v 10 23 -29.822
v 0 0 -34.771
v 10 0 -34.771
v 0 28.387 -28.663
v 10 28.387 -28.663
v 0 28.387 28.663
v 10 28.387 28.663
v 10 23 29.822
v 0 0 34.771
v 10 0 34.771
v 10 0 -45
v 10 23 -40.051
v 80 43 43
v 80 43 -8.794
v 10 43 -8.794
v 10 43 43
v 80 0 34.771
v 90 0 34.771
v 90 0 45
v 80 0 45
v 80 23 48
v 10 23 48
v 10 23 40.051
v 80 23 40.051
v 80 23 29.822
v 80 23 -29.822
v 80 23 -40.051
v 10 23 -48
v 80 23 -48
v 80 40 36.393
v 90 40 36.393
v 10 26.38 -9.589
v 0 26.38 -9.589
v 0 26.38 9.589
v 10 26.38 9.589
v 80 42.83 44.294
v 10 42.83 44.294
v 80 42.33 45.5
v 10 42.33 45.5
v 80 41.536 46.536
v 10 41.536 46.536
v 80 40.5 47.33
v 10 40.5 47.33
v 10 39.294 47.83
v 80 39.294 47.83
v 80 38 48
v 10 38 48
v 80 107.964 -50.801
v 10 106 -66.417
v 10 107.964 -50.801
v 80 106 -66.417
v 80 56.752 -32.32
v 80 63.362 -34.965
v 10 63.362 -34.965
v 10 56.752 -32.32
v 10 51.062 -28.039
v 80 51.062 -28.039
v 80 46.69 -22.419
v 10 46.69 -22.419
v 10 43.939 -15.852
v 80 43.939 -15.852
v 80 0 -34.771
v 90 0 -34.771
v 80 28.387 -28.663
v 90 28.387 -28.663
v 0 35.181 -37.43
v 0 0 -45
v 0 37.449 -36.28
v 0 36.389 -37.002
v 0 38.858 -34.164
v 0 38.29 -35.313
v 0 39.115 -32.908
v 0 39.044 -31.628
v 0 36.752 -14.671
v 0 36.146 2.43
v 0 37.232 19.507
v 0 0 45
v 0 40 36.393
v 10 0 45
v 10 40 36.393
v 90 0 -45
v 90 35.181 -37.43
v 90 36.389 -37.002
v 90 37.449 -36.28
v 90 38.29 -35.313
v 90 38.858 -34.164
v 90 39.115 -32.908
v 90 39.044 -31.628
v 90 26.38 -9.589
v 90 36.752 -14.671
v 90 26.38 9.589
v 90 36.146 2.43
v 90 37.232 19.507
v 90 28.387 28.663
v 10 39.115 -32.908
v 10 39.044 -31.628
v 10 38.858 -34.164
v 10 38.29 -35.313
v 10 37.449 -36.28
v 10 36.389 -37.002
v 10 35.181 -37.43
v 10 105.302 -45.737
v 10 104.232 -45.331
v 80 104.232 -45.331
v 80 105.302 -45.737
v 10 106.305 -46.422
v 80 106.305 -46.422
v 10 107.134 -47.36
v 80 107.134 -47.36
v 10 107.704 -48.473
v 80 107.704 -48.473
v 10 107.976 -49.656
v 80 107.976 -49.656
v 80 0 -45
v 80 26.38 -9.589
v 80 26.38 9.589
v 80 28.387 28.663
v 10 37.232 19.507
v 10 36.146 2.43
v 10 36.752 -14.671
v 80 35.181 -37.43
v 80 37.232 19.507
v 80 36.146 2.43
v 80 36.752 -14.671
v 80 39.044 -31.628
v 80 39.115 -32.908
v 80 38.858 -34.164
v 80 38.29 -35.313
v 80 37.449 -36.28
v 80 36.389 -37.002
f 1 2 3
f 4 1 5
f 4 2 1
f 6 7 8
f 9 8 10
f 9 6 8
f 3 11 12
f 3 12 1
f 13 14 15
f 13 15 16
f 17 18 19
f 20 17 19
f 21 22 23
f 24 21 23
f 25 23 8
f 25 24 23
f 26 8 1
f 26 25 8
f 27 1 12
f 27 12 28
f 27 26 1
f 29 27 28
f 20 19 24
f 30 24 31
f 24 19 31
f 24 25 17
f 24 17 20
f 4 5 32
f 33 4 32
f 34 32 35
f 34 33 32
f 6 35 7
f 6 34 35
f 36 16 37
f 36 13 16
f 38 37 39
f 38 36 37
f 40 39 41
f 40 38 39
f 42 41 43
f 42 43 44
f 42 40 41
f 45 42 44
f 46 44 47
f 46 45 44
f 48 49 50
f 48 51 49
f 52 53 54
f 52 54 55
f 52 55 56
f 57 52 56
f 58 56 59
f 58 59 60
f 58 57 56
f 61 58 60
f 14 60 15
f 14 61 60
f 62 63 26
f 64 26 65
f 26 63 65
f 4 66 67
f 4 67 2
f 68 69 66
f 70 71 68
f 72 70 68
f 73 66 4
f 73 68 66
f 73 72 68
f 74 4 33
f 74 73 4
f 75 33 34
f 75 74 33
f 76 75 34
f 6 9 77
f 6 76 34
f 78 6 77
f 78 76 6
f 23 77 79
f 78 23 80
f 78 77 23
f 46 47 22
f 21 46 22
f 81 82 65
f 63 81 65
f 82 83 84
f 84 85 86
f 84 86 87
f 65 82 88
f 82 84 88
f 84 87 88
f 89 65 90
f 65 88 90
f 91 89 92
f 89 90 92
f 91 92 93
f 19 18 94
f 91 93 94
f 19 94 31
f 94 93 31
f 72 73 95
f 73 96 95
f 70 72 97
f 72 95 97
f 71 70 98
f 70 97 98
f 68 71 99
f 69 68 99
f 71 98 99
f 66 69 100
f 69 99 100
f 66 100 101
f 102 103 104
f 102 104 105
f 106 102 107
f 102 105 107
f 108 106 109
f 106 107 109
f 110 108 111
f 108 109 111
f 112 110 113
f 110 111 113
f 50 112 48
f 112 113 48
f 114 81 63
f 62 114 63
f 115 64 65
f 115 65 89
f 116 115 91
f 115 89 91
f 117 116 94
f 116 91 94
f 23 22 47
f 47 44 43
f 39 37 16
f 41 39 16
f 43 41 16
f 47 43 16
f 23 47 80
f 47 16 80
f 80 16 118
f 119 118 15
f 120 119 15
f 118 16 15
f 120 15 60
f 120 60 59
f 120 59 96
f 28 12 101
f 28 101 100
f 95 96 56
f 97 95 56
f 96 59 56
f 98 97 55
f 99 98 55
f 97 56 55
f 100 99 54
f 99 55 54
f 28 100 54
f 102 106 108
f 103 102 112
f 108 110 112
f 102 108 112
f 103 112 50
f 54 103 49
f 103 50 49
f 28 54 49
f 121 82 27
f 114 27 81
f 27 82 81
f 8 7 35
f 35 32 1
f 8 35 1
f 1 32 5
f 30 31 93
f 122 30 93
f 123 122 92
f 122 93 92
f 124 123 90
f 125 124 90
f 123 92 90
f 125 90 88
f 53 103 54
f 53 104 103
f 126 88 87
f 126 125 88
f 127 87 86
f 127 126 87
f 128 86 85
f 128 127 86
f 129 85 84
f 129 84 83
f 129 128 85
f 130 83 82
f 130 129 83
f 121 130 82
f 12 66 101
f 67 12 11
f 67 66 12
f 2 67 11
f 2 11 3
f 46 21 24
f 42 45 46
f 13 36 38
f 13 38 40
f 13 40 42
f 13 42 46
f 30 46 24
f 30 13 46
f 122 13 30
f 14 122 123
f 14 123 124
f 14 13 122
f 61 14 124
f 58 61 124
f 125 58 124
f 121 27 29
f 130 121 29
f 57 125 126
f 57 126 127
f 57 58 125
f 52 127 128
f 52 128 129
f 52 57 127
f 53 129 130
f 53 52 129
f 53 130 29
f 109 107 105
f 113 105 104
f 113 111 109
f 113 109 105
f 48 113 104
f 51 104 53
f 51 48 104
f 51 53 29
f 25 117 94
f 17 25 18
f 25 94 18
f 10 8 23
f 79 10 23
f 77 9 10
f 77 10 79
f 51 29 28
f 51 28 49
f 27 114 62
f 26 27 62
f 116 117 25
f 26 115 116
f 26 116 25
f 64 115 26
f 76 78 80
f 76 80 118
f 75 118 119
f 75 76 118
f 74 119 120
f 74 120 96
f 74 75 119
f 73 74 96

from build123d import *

# Parameters (mm, degrees)
BOSS_EXTRUDE1_DEPTH = 10
FILLET1_R           = 5
BOSS_EXTRUDE2_DEPTH = 35
FILLET2_R           = 5


with BuildPart() as part:
    # Sketch1 → Boss-Extrude1 (new body)
    with BuildSketch(Plane(origin=(0, 0, 0), x_dir=(0, 0, -1), z_dir=(1, 0, 0))):
        with BuildLine():
            Line((-45, 0), (-36.39286513, 40))
            ThreePointArc((-36.39286513, 40), (0, 36.128824769), (36.39286513, 40))
            Line((36.39286513, 40), (45, 0))
            Line((45, 0), (34.771110854, 0))
            Line((34.771110854, 0), (28.662747002, 28.387443413))
            ThreePointArc((28.662747002, 28.387443413), (0, 26.128824769), (-28.662747002, 28.387443413))
            Line((-28.662747002, 28.387443413), (-34.771110854, 0))
            Line((-34.771110854, 0), (-45, 0))
        make_face()
    extrude(amount=BOSS_EXTRUDE1_DEPTH)

    # Fillet1
    fillet1_edges = [part.edges().sort_by_distance(p)[0] for p in [
        (5, 40, -36.39286513),
    ]]
    fillet(fillet1_edges, radius=FILLET1_R)


with BuildPart() as body_2:
    # Mirror3: mirrored copy
    add(part.part.mirror(Plane(origin=(45, 0, 0), x_dir=(0, 0, 1), z_dir=(1, 0, 0))))


with BuildPart() as part_1:
    add(part.part)

    add(body_2.part)  # Boss-Extrude2 merges body 2
    # Sketch2 → Boss-Extrude2 (add, symmetric)
    with BuildSketch(Plane(origin=(45, 0, 0), x_dir=(0, 0, -1), z_dir=(1, 0, 0))):
        with BuildLine():
            Line((-48, 23), (48, 23))
            Line((48, 23), (66.416945106, 106))
            Line((66.416945106, 106), (46.416945106, 108.51539025))
            Line((46.416945106, 108.51539025), (45.96709586, 106.741704173))
            Line((45.96709586, 106.741704173), (34.965043573, 63.362311747))
            ThreePointArc((34.965043573, 63.362311747), (25.373507712, 48.690171483), (8.793664269, 43))
            Line((8.793664269, 43), (-43, 43))
            ThreePointArc((-43, 43), (-46.535533906, 41.535533906), (-48, 38))
            Line((-48, 38), (-48, 23))
        make_face()
    extrude(amount=BOSS_EXTRUDE2_DEPTH, both=True)

    # Fillet2
    fillet2_edges = [part_1.edges().sort_by_distance(p)[0] for p in [
        (45, 108.51539025, -46.416945106),
    ]]
    fillet(fillet2_edges, radius=FILLET2_R)


solid = part_1.part
